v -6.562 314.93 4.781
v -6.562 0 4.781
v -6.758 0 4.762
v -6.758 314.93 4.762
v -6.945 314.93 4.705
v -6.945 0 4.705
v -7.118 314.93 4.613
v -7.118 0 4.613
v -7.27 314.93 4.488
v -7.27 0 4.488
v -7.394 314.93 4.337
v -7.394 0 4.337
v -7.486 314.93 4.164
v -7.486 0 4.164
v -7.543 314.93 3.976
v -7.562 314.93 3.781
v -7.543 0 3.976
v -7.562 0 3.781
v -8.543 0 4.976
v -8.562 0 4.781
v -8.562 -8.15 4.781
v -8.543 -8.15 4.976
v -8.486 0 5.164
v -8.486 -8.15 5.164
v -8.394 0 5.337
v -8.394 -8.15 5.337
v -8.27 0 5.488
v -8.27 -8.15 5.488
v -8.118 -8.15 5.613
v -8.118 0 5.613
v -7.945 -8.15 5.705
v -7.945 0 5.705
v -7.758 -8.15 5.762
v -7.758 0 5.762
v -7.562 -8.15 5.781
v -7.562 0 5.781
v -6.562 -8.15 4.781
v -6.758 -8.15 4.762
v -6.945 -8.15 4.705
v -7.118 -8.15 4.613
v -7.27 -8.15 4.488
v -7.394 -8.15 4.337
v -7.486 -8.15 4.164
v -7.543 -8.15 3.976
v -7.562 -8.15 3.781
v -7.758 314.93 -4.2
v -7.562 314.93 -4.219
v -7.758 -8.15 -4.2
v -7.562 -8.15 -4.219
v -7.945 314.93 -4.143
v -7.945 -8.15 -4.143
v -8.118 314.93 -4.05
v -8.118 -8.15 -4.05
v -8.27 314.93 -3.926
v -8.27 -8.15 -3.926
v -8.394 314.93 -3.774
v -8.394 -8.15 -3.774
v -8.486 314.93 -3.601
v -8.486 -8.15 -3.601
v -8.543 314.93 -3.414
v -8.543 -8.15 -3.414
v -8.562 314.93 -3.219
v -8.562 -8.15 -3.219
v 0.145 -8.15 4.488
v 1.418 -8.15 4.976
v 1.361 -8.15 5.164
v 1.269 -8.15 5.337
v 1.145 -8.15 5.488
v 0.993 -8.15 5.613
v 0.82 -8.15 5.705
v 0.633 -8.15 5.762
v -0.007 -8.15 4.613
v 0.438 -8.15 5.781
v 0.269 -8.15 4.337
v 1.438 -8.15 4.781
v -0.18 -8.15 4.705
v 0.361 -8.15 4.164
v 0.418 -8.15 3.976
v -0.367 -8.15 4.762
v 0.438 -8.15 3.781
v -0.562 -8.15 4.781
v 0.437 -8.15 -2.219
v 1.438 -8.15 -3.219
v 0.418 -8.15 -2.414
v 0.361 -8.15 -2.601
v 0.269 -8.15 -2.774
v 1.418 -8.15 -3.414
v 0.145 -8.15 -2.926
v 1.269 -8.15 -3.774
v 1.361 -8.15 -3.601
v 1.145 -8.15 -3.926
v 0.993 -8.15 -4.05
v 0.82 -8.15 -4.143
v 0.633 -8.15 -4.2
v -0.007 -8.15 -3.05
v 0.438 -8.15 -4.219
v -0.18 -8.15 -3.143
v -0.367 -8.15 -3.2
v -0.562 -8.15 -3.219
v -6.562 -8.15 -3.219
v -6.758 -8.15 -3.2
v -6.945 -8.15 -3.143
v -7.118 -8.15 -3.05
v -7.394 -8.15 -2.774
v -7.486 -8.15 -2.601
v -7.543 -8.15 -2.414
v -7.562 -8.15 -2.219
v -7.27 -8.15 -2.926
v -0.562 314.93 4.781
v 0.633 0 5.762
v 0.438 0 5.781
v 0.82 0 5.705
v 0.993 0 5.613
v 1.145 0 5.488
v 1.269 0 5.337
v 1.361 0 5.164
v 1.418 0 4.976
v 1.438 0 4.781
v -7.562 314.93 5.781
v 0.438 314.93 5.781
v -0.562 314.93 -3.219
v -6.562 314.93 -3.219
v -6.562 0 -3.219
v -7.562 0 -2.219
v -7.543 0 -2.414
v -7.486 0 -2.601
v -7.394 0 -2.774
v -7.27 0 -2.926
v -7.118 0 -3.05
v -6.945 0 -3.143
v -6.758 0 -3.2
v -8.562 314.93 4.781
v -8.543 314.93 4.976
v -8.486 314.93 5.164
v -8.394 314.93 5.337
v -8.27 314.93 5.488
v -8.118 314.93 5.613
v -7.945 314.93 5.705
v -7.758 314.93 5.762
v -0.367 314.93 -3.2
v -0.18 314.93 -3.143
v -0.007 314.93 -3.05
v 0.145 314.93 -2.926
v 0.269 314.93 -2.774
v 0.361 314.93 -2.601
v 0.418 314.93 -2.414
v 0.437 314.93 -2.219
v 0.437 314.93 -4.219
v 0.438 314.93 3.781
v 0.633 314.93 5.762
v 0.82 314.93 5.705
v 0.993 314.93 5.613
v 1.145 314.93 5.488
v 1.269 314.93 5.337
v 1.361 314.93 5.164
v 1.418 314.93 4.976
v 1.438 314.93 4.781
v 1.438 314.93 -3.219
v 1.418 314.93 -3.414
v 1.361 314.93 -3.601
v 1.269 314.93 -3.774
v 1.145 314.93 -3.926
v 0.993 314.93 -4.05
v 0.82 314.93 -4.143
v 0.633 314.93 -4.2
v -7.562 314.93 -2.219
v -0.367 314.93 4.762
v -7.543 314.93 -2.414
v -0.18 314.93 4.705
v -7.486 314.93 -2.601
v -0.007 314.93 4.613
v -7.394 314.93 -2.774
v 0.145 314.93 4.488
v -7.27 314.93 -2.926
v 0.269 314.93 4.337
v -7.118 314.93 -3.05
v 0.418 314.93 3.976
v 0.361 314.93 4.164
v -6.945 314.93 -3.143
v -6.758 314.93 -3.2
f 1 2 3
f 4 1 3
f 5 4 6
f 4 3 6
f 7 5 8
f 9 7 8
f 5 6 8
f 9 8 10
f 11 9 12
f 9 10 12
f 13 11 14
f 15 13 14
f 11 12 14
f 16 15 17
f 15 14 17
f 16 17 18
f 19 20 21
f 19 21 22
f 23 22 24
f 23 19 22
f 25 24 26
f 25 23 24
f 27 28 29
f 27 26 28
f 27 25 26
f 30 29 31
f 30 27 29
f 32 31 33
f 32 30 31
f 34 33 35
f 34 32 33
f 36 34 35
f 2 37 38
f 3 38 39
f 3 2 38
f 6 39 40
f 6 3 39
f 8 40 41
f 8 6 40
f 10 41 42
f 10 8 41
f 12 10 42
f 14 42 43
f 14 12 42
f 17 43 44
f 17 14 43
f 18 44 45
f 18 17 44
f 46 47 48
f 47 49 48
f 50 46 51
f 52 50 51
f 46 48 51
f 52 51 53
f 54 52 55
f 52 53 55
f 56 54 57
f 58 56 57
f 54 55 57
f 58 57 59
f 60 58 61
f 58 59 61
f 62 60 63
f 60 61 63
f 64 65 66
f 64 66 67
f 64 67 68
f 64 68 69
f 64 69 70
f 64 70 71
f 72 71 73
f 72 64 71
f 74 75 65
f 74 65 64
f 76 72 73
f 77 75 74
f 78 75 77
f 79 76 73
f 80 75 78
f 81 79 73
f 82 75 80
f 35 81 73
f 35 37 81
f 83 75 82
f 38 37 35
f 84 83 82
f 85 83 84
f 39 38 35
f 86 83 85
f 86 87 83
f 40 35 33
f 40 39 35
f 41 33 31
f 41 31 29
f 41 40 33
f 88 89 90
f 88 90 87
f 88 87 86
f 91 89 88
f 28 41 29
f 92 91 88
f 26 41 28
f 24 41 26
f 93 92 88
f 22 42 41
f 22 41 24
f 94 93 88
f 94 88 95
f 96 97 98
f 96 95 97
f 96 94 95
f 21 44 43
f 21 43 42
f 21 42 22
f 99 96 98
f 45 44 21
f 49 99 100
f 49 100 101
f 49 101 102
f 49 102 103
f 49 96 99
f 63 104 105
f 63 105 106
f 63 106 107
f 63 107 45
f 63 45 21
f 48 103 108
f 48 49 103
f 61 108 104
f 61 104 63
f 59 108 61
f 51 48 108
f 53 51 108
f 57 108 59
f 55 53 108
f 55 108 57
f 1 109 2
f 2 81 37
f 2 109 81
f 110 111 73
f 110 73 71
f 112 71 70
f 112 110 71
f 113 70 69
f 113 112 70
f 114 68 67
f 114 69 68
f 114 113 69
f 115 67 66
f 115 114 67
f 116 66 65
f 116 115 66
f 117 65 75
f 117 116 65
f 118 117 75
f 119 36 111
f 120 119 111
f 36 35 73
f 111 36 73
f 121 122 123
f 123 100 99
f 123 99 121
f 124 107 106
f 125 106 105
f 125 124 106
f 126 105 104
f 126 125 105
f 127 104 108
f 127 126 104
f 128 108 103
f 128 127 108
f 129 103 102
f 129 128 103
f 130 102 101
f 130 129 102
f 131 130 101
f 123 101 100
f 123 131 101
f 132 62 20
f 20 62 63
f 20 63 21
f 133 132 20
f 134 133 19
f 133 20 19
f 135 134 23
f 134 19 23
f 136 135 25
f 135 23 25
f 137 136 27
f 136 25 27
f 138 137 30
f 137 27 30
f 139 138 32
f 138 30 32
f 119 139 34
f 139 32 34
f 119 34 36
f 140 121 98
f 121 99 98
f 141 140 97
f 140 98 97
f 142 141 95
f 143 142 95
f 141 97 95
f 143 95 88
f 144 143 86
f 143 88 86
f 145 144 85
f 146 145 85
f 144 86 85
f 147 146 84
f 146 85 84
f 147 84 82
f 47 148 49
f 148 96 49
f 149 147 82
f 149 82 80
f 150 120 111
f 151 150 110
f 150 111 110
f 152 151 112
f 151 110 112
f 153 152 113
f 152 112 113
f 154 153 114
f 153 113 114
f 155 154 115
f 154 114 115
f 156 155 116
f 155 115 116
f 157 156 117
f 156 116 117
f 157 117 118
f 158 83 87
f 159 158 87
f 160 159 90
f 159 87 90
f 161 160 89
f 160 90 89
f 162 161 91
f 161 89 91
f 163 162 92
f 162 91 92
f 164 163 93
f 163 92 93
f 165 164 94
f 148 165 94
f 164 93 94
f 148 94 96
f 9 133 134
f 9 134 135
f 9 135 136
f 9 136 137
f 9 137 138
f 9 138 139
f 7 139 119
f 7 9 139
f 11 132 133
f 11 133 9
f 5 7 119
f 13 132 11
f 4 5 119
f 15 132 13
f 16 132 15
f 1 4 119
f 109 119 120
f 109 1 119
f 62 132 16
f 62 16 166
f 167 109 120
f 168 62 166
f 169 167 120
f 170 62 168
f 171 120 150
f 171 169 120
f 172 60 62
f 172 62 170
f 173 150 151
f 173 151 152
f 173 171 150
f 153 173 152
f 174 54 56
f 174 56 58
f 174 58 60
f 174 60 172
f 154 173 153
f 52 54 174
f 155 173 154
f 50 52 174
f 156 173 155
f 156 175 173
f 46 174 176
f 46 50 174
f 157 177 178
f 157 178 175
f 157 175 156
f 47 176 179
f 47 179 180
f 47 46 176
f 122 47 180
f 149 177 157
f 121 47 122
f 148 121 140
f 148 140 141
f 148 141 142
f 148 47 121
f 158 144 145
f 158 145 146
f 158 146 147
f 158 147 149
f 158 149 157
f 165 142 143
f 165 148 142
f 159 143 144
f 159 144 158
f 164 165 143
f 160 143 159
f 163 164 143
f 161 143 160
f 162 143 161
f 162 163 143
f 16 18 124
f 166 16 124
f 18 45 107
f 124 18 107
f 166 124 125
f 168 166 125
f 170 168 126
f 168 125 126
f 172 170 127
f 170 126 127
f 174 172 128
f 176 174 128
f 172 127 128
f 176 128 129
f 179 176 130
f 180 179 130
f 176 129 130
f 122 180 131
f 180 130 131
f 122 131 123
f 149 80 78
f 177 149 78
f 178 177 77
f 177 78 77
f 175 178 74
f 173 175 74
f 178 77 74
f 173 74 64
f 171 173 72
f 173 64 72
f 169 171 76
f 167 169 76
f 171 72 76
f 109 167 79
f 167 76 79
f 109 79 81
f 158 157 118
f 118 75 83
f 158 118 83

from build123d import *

# Parameters (mm, degrees)
SKETCH1_W           = 10
SKETCH1_H           = 10
BOSS_EXTRUDE1_DEPTH = 310
CUT_EXTRUDE1_DEPTH  = 310
FILLET1_R           = 1
FILLET2_R           = 1
FILLET3_R           = 1
FILLET4_R           = 1
BOSS_EXTRUDE2_DEPTH = 42
CUT_EXTRUDE2_DEPTH  = 35.07
CUT_EXTRUDE3_DEPTH  = 2
BOSS_EXTRUDE4_DEPTH = 370
CUT_EXTRUDE4_DEPTH  = 46.92
SKETCH14_W          = 1
SKETCH14_H          = 46.92
CUT_EXTRUDE5_DEPTH  = 46.92


with BuildPart() as part:
    # Sketch1 → Boss-Extrude1 (new body)
    with BuildSketch(Plane(origin=(0, 0, 0), x_dir=(1, 0, 0), z_dir=(0, 1, 0))):
        with Locations((-3.5625, -0.78125)):
            Rectangle(SKETCH1_W, SKETCH1_H)
    extrude(amount=BOSS_EXTRUDE1_DEPTH)

    # Sketch2 → Cut-Extrude1 (cut)
    with BuildSketch(Plane(origin=(0, 0, 0), x_dir=(-1, 0, 0), z_dir=(0, -1, 0))):
        Polygon((-0.4375, -4.78125), (7.5625, -4.78125), (-0.4375, 3.21875), align=None)
        Polygon((-0.4375, 3.21875), (7.5625, -4.78125), (7.5625, 3.21875), align=None)
    extrude(amount=-CUT_EXTRUDE1_DEPTH, mode=Mode.SUBTRACT)

    # Fillet1
    fillet1_edges = [part.edges().sort_by_distance(p)[0] for p in [
        (0.4375, 155, -3.21875),
        (-8.5625, 155, 5.78125),
        (-8.5625, 155, -4.21875),
        (1.4375, 155, 5.78125),
    ]]
    fillet(fillet1_edges, radius=FILLET1_R)

    # Fillet2
    fillet2_edges = [part.edges().sort_by_distance(p)[0] for p in [
        (-7.5625, 155, 4.78125),
        (1.4375, 155, -4.21875),
    ]]
    fillet(fillet2_edges, radius=FILLET2_R)

    # Fillet3
    fillet3_edges = [part.edges().sort_by_distance(p)[0] for p in [
        (0.4375, 155, 4.78125),
    ]]
    fillet(fillet3_edges, radius=FILLET3_R)

    # Fillet4
    fillet4_edges = [part.edges().sort_by_distance(p)[0] for p in [
        (-7.5625, 155, -3.21875),
    ]]
    fillet(fillet4_edges, radius=FILLET4_R)

    # Sketch3 → Boss-Extrude2 (add)
    with BuildSketch(Plane(origin=(0, 310, 0), x_dir=(1, 0, 0), z_dir=(0, 1, 0))):
        with BuildLine():
            ThreePointArc((0.4375, -5.78125), (1.144606781, -5.488356781), (1.4375, -4.78125))
            Line((1.4375, -4.78125), (1.4375, 3.21875))
            ThreePointArc((1.4375, 3.21875), (1.144606781, 3.925856781), (0.4375, 4.21875))
            Line((0.4375, 4.21875), (-7.5625, 4.21875))
            ThreePointArc((-7.5625, 4.21875), (-8.269606781, 3.925856781), (-8.5625, 3.21875))
            Line((-8.5625, 3.21875), (-8.5625, -4.78125))
            ThreePointArc((-8.5625, -4.78125), (-8.269606781, -5.488356781), (-7.5625, -5.78125))
            Line((-7.5625, -5.78125), (0.4375, -5.78125))
        make_face()
        with BuildLine():
            ThreePointArc((-0.5625, 3.21875), (0.144606781, 2.925856781), (0.4375, 2.21875))
            Line((0.4375, 2.21875), (0.4375, -3.78125))
            ThreePointArc((0.4375, -3.78125), (0.144606781, -4.488356781), (-0.5625, -4.78125))
            Line((-0.5625, -4.78125), (-6.5625, -4.78125))
            ThreePointArc((-6.5625, -4.78125), (-7.269606781, -4.488356781), (-7.5625, -3.78125))
            Line((-7.5625, -3.78125), (-7.5625, 2.21875))
            ThreePointArc((-7.5625, 2.21875), (-7.269606781, 2.925856781), (-6.5625, 3.21875))
            Line((-6.5625, 3.21875), (-0.5625, 3.21875))
        make_face(mode=Mode.SUBTRACT)
    extrude(amount=BOSS_EXTRUDE2_DEPTH)

    # Sketch4 → Cut-Extrude2 (cut)
    with BuildSketch(Plane(origin=(0, 352, 0), x_dir=(1, 0, 0), z_dir=(0, 1, 0))):
        with BuildLine():
            Line((-7.5625, -5.78125), (0.4375, -5.78125))
            ThreePointArc((0.4375, -5.78125), (1.144606781, -5.488356781), (1.4375, -4.78125))
            Line((1.4375, -4.78125), (1.4375, 3.21875))
            ThreePointArc((1.4375, 3.21875), (1.144606781, 3.925856781), (0.4375, 4.21875))
            Line((0.4375, 4.21875), (-7.5625, 4.21875))
            ThreePointArc((-7.5625, 4.21875), (-8.269606781, 3.925856781), (-8.5625, 3.21875))
            Line((-8.5625, 3.21875), (-8.5625, -4.78125))
            ThreePointArc((-8.5625, -4.78125), (-8.269606781, -5.488356781), (-7.5625, -5.78125))
        make_face()
        with BuildLine():
            Line((-6.5625, 3.21875), (-0.5625, 3.21875))
            ThreePointArc((-0.5625, 3.21875), (0.144606781, 2.925856781), (0.4375, 2.21875))
            Line((0.4375, 2.21875), (0.4375, -3.78125))
            ThreePointArc((0.4375, -3.78125), (0.144606781, -4.488356781), (-0.5625, -4.78125))
            Line((-0.5625, -4.78125), (-6.5625, -4.78125))
            ThreePointArc((-6.5625, -4.78125), (-7.269606781, -4.488356781), (-7.5625, -3.78125))
            Line((-7.5625, -3.78125), (-7.5625, 2.21875))
            ThreePointArc((-7.5625, 2.21875), (-7.269606781, 2.925856781), (-6.5625, 3.21875))
        make_face(mode=Mode.SUBTRACT)
    extrude(amount=-CUT_EXTRUDE2_DEPTH, mode=Mode.SUBTRACT)

    # Sketch6 → Cut-Extrude3 (cut)
    with BuildSketch(Plane(origin=(0, 316.93, 0), x_dir=(1, 0, 0), z_dir=(0, 1, 0))):
        with BuildLine():
            Line((-7.5625, -5.78125), (0.4375, -5.78125))
            ThreePointArc((0.4375, -5.78125), (1.144606781, -5.488356781), (1.4375, -4.78125))
            Line((1.4375, -4.78125), (1.4375, 3.21875))
            ThreePointArc((1.4375, 3.21875), (1.144606781, 3.925856781), (0.4375, 4.21875))
            Line((0.4375, 4.21875), (-7.5625, 4.21875))
            ThreePointArc((-7.5625, 4.21875), (-8.269606781, 3.925856781), (-8.5625, 3.21875))
            Line((-8.5625, 3.21875), (-8.5625, -4.78125))
            ThreePointArc((-8.5625, -4.78125), (-8.269606781, -5.488356781), (-7.5625, -5.78125))
        make_face()
    extrude(amount=-CUT_EXTRUDE3_DEPTH, mode=Mode.SUBTRACT)

    # Sketch7 → Boss-Extrude4 (add)
    with BuildSketch(Plane(origin=(0, 314.93, 0), x_dir=(1, 0, 0), z_dir=(0, 1, 0))):
        with BuildLine():
            Line((-8.5625, 3.21875), (-8.5625, -4.78125))
            ThreePointArc((-8.5625, -4.78125), (-8.269606781, -5.488356781), (-7.5625, -5.78125))
            Line((-7.5625, -5.78125), (0.4375, -5.78125))
            ThreePointArc((0.4375, -5.78125), (1.144606781, -5.488356781), (1.4375, -4.78125))
            Line((1.4375, -4.78125), (1.4375, 3.21875))
            ThreePointArc((1.4375, 3.21875), (1.144606781, 3.925856781), (0.4375, 4.21875))
            Line((0.4375, 4.21875), (-7.5625, 4.21875))
            ThreePointArc((-7.5625, 4.21875), (-8.269606781, 3.925856781), (-8.5625, 3.21875))
        make_face()
        with BuildLine():
            Line((-6.5625, 3.21875), (-0.5625, 3.21875))
            ThreePointArc((-0.5625, 3.21875), (0.144606781, 2.925856781), (0.4375, 2.21875))
            Line((0.4375, 2.21875), (0.4375, -3.78125))
            ThreePointArc((0.4375, -3.78125), (0.144606781, -4.488356781), (-0.5625, -4.78125))
            Line((-0.5625, -4.78125), (-6.5625, -4.78125))
            ThreePointArc((-6.5625, -4.78125), (-7.269606781, -4.488356781), (-7.5625, -3.78125))
            Line((-7.5625, -3.78125), (-7.5625, 2.21875))
            ThreePointArc((-7.5625, 2.21875), (-7.269606781, 2.925856781), (-6.5625, 3.21875))
        make_face(mode=Mode.SUBTRACT)
    extrude(amount=-BOSS_EXTRUDE4_DEPTH)

    # Sketch13 → Cut-Extrude4 (cut)
    with BuildSketch(Plane(origin=(0, -55.07, 0), x_dir=(-1, 0, 0), z_dir=(0, -1, 0))):
        with BuildLine():
            Line((6.7625, -4.78125), (7.5625, -5.78125))
            ThreePointArc((7.5625, -5.78125), (8.269606781, -5.488356781), (8.5625, -4.78125))
            Line((8.5625, -4.78125), (8.5625, 3.21875))
            ThreePointArc((8.5625, 3.21875), (8.269606781, 3.925856781), (7.5625, 4.21875))
            Line((7.5625, 4.21875), (3.5625, 4.21875))
            Line((3.5625, 4.21875), (3.5625, 3.21875))
            Line((3.5625, 3.21875), (6.5625, 3.21875))
            Line((6.5625, 3.21875), (7.5625, 3.21875))
            Line((7.5625, 3.21875), (7.5625, 2.21875))
            Line((7.5625, 2.21875), (7.5625, -3.78125))
            Line((7.5625, -3.78125), (7.5625, -4.78125))
            Line((7.5625, -4.78125), (6.7625, -4.78125))
        make_face()
        with BuildLine():
            Line((-0.4375, -5.78125), (7.5625, -5.78125))
            Line((7.5625, -5.78125), (6.7625, -4.78125))
            Line((6.7625, -4.78125), (6.5625, -4.78125))
            Line((6.5625, -4.78125), (0.5625, -4.78125))
            Line((0.5625, -4.78125), (-0.4375, -4.78125))
            Line((-0.4375, -4.78125), (-0.4375, -3.78125))
            Line((-0.4375, -3.78125), (-0.4375, 2.21875))
            Line((-0.4375, 2.21875), (-0.4375, 3.21875))
            Line((-0.4375, 3.21875), (0.3625, 3.21875))
            Line((0.3625, 3.21875), (-0.4375, 4.21875))
            ThreePointArc((-0.4375, 4.21875), (-1.144606781, 3.925856781), (-1.4375, 3.21875))
            Line((-1.4375, 3.21875), (-1.4375, -4.78125))
            ThreePointArc((-1.4375, -4.78125), (-1.144606781, -5.488356781), (-0.4375, -5.78125))
        make_face()
        Polygon((-0.4375, 4.21875), (0.3625, 3.21875), (0.5625, 3.21875), (3.5625, 3.21875), (3.5625, 4.21875), align=None)
    extrude(amount=-CUT_EXTRUDE4_DEPTH, mode=Mode.SUBTRACT)

    # Sketch14 → Cut-Extrude5 (cut)
    with BuildSketch(Plane(origin=(0.4375, 0, 0), x_dir=(0, 0, -1), z_dir=(1, 0, 0))):
        with Locations((-4.28125, -31.61)):
            Rectangle(SKETCH14_W, SKETCH14_H)
        with Locations((2.71875, -31.61)):
            Rectangle(SKETCH14_W, SKETCH14_H)
    extrude(amount=-CUT_EXTRUDE5_DEPTH, mode=Mode.SUBTRACT)


solid = part.part
